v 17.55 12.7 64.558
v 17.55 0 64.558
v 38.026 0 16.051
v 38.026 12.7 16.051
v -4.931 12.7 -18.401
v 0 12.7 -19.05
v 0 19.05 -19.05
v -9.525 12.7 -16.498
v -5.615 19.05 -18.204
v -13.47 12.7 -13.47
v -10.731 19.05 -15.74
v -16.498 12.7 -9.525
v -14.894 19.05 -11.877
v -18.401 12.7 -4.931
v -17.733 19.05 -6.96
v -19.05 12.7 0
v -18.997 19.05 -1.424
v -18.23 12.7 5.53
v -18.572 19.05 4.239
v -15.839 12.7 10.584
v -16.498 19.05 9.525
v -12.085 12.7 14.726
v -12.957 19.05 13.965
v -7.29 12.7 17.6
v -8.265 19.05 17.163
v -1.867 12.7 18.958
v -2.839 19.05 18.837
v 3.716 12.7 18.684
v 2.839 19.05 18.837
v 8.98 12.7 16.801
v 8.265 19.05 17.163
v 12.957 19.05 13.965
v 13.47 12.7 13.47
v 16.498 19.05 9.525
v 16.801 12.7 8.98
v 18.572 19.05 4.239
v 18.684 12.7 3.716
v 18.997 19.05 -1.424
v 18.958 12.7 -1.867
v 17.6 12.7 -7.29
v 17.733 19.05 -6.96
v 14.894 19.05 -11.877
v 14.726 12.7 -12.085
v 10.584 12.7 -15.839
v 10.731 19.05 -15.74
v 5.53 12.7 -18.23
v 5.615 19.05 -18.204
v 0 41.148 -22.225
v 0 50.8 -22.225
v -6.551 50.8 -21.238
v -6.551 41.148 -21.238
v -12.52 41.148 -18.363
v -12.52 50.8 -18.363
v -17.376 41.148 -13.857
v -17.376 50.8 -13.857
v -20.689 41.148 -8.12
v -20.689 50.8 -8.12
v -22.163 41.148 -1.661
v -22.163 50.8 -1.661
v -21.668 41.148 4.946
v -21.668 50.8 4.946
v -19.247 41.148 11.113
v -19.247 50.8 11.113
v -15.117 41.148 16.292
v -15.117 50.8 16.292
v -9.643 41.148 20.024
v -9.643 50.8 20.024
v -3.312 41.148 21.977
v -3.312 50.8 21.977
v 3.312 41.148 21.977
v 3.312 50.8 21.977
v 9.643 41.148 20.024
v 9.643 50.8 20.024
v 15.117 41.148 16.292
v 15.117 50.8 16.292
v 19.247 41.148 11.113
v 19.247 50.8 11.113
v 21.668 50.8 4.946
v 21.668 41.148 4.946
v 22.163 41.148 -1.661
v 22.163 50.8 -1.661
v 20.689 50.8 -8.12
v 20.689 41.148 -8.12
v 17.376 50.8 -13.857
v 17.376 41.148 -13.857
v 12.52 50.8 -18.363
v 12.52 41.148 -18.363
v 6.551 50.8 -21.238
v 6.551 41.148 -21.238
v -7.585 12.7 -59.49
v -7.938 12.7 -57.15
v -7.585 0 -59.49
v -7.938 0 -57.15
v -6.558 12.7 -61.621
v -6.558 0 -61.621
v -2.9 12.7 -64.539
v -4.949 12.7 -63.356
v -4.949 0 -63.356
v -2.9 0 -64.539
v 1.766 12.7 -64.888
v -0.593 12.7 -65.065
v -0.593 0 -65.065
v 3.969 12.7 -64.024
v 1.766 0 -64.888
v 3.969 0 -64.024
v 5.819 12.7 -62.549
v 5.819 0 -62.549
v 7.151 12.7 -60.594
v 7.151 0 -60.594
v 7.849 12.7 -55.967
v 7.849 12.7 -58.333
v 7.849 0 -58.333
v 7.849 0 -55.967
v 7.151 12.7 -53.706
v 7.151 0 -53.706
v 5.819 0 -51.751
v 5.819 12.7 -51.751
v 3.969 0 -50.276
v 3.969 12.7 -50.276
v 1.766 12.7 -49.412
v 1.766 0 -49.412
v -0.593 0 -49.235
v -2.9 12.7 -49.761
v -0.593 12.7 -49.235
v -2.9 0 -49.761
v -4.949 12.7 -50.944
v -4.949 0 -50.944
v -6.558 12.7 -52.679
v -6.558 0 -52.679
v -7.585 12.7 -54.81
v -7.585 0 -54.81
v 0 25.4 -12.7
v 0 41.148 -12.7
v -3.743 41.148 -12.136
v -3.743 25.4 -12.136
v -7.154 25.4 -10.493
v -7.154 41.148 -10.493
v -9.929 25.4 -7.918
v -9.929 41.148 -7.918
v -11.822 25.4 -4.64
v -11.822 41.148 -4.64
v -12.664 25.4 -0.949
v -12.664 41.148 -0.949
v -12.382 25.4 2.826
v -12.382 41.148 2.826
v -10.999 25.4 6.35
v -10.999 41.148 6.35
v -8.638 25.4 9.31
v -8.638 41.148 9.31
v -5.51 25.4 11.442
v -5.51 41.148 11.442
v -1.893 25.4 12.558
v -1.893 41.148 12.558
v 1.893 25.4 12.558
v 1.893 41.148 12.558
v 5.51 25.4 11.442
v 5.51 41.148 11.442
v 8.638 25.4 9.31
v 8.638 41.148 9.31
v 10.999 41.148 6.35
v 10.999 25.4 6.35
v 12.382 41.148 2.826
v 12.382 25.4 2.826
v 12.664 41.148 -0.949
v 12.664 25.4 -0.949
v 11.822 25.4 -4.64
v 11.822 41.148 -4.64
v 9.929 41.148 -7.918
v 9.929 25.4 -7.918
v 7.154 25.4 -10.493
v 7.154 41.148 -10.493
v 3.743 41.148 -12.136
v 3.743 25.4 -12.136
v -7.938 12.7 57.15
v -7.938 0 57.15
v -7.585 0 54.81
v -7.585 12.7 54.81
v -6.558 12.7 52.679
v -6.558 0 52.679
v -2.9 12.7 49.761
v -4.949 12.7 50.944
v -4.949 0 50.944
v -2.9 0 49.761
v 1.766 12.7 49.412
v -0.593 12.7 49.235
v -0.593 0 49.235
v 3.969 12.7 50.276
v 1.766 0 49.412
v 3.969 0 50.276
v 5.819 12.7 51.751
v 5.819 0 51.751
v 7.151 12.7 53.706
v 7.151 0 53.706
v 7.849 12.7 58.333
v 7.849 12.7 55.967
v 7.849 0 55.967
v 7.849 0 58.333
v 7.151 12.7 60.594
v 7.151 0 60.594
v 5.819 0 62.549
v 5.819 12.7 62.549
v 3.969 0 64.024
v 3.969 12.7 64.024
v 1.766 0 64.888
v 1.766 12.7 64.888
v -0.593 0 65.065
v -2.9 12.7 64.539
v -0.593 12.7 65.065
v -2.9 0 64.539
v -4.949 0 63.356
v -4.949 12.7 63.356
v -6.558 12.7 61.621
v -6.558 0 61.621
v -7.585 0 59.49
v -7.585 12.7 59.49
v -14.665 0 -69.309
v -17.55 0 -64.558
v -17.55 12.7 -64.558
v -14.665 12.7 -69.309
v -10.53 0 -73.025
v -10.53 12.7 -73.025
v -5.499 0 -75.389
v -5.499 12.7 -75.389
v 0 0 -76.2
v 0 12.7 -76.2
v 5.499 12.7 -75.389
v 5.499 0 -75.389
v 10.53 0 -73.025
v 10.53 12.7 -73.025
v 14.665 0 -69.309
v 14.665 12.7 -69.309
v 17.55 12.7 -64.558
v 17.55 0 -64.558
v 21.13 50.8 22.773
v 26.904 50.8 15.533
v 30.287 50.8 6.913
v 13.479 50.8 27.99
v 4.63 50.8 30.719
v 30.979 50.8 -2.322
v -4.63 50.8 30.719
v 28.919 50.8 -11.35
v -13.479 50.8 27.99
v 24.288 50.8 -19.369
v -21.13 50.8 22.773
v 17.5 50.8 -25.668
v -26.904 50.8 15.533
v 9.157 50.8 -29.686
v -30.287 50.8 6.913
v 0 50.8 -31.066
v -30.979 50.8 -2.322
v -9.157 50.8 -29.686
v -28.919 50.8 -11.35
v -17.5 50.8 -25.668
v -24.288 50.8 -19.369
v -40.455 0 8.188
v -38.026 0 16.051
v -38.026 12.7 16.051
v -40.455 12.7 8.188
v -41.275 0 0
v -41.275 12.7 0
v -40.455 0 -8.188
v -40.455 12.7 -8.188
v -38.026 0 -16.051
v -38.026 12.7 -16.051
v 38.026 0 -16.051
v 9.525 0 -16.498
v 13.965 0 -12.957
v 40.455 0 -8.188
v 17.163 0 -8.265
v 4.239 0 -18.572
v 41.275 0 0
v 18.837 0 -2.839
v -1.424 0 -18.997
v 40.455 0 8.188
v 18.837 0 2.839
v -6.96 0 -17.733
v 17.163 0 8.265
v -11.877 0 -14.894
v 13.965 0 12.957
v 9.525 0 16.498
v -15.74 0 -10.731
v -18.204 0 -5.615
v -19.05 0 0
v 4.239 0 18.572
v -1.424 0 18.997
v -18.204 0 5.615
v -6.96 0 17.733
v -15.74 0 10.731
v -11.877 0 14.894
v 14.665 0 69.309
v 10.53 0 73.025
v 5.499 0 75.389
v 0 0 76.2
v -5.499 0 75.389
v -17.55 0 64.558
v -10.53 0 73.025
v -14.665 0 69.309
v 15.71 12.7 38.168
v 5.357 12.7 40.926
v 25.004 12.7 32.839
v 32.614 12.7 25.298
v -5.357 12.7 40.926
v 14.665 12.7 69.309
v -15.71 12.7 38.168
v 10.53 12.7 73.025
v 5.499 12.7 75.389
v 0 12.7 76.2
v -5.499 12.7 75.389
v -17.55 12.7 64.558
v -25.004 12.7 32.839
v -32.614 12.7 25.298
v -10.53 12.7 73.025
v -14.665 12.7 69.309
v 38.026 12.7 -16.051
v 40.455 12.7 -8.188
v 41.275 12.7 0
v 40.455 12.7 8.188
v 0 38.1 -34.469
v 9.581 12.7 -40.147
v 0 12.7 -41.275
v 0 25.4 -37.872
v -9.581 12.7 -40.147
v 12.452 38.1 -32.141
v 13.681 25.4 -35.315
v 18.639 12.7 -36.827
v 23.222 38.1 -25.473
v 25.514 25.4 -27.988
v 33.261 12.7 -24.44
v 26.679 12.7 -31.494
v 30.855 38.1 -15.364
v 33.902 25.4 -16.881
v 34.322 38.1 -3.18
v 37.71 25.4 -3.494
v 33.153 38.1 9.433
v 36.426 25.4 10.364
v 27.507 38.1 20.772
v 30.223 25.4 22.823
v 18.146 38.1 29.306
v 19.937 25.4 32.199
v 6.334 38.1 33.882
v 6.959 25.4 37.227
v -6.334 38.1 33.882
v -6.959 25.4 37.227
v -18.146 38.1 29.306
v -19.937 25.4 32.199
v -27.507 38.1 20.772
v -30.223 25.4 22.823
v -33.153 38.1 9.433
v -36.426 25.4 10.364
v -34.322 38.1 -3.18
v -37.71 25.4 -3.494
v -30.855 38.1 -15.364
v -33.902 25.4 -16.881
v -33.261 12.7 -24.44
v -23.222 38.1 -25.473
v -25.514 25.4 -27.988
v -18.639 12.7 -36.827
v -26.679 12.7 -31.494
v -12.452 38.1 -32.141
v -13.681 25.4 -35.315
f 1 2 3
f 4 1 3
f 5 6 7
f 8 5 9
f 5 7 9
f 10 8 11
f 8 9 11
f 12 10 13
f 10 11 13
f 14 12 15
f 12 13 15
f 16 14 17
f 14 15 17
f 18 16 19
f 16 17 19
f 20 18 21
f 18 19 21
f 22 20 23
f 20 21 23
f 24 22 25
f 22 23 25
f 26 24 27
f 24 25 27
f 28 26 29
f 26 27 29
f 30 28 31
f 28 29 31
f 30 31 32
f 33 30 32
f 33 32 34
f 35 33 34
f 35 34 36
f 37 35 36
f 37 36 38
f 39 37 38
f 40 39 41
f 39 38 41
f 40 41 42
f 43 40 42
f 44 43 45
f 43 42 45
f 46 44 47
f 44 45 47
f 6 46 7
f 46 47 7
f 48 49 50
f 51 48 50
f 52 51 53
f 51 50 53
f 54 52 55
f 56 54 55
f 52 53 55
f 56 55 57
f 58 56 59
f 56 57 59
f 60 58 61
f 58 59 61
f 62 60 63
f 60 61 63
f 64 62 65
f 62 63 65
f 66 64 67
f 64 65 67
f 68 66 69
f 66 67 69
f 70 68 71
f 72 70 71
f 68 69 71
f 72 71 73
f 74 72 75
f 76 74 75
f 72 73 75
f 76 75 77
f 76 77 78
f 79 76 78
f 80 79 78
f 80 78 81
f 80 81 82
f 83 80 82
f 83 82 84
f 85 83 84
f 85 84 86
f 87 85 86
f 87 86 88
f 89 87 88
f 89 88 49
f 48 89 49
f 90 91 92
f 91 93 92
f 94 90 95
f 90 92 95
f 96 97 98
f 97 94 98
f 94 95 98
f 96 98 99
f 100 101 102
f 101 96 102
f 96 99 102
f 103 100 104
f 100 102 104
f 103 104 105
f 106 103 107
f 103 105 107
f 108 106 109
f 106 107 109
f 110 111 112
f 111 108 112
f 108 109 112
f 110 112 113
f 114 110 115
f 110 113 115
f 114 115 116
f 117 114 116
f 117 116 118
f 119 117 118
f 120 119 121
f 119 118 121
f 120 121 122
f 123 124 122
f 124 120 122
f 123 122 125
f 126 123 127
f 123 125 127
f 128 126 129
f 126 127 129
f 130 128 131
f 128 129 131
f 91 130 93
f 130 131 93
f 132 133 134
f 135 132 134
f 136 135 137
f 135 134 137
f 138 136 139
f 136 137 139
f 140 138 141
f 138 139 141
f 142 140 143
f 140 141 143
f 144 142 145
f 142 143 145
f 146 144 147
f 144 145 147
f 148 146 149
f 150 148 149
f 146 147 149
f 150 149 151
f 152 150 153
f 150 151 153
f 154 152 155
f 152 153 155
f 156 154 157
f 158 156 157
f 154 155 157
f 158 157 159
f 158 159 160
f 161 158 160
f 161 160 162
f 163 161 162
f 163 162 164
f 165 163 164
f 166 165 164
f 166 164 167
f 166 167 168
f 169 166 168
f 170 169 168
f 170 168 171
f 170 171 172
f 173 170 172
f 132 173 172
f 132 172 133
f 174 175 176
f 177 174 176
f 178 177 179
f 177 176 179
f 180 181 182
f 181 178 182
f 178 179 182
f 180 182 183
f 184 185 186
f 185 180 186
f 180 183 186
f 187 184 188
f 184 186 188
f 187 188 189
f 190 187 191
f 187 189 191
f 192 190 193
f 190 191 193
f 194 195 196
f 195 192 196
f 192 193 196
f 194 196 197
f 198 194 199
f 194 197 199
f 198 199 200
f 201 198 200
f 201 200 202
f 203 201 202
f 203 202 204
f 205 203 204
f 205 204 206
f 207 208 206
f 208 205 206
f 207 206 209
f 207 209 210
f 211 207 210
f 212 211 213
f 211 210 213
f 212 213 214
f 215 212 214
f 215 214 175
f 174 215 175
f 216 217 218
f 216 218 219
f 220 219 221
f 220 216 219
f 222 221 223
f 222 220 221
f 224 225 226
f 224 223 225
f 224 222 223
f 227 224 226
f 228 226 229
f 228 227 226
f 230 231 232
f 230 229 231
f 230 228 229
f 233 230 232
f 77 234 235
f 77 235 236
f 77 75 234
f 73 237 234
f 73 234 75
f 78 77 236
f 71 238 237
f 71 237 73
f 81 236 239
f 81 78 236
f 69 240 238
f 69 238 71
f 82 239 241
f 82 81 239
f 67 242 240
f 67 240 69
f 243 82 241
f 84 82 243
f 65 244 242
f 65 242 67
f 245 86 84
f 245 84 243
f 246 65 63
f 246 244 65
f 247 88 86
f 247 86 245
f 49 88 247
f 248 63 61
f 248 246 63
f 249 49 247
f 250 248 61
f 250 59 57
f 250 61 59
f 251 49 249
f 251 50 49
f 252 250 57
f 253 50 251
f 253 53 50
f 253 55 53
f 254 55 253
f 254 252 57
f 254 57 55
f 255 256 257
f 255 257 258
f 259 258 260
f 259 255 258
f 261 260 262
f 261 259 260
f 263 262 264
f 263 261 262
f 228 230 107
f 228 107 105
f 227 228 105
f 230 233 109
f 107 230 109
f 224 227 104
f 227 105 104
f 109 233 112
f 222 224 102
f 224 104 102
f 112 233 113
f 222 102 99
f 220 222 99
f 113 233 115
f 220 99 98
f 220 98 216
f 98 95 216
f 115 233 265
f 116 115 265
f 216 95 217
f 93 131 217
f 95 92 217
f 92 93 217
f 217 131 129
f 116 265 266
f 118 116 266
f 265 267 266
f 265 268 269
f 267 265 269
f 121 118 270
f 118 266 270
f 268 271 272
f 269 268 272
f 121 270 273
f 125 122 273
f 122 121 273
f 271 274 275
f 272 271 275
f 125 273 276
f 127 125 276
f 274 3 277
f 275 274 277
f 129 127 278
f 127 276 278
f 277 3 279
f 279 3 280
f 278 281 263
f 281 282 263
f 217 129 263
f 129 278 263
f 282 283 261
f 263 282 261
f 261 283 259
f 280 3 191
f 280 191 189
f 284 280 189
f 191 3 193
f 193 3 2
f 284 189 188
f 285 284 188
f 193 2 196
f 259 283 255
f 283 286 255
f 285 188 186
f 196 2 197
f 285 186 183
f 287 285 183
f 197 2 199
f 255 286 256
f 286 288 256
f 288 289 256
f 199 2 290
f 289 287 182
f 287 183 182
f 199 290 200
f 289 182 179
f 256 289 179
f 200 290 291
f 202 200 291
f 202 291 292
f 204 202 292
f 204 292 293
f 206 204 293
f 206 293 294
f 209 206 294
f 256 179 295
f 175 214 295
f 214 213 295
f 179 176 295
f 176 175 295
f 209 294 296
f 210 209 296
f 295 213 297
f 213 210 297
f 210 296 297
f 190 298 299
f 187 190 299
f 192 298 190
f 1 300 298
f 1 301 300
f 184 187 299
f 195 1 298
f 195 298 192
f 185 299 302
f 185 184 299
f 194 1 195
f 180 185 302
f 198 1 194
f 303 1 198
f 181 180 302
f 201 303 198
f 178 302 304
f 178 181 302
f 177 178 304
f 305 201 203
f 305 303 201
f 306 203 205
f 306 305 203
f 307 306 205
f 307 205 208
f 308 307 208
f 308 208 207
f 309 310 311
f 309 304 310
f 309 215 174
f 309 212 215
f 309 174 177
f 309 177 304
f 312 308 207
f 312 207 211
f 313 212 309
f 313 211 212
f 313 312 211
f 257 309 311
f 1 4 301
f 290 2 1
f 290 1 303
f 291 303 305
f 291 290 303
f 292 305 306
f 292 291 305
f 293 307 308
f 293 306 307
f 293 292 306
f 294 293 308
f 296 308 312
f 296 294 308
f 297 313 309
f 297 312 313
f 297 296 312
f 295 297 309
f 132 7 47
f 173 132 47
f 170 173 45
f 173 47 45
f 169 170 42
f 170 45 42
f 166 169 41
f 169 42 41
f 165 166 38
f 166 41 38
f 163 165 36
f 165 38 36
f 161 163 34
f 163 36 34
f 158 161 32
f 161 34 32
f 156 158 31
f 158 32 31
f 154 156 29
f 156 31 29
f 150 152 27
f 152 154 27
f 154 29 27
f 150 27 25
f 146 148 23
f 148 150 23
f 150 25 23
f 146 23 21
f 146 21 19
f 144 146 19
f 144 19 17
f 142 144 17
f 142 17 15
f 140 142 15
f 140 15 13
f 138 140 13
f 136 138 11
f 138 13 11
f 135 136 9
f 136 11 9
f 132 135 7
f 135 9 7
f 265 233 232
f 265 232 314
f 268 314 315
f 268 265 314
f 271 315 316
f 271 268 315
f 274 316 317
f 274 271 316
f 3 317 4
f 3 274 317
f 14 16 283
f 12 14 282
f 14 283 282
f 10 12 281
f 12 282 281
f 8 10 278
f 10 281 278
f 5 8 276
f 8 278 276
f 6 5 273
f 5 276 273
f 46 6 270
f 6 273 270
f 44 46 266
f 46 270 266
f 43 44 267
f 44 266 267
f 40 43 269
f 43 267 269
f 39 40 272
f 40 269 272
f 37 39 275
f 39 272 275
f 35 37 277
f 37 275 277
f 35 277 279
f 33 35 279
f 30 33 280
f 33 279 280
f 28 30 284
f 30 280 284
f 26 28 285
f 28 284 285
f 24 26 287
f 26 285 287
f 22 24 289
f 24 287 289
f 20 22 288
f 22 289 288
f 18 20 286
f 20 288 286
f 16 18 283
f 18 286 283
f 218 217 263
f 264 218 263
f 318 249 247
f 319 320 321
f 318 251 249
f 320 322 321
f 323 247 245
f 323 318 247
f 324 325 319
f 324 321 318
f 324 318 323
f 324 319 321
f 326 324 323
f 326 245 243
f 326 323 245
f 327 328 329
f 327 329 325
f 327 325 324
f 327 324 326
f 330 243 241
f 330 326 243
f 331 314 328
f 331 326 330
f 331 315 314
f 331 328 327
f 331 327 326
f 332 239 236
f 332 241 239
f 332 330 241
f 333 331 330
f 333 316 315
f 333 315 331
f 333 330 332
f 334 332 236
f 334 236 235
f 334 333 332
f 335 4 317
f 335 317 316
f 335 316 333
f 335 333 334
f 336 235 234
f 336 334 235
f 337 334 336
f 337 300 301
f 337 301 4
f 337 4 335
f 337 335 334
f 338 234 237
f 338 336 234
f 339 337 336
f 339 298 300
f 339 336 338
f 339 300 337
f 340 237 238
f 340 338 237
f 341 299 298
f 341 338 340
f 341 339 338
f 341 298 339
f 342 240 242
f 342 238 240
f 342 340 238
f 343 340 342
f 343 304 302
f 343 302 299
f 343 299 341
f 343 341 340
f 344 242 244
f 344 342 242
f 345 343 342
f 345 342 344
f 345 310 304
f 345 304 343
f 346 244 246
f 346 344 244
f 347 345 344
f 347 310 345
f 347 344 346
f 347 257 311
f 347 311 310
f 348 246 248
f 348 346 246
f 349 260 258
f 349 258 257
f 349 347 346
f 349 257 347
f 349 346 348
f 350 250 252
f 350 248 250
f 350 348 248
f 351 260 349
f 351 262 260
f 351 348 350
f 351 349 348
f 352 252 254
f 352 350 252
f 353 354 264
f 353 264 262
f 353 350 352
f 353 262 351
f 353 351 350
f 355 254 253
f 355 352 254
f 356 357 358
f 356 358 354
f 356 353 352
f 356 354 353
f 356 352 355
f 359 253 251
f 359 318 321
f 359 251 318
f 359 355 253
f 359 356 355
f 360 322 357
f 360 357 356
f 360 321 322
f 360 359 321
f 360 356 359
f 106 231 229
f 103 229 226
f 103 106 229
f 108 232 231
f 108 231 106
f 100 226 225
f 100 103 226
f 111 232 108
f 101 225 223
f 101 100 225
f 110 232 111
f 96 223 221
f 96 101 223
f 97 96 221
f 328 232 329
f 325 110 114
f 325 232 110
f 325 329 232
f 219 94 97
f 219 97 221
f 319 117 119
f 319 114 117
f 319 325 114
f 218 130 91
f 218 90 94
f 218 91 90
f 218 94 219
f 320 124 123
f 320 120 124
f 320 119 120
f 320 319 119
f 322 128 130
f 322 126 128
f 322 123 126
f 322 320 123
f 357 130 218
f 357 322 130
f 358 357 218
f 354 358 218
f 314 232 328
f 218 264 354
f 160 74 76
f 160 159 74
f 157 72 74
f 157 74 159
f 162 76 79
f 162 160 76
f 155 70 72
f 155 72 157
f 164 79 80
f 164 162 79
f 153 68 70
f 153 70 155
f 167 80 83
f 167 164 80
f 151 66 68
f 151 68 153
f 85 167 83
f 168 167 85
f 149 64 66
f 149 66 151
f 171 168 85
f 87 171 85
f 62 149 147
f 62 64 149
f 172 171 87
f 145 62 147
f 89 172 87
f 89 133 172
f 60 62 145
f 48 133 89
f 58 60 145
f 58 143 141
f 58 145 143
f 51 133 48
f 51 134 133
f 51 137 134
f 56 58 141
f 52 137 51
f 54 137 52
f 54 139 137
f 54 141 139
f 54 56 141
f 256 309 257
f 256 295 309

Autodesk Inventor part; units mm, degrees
ref_plane "YZ Plane" through (0, 0, 0) normal (1, 0, 0) x (0, 1, 0)
ref_plane "XZ Plane" through (0, 0, 0) normal (0, 1, 0) x (-1, 0, 0)
ref_plane "XY Plane" through (0, 0, 0) normal (0, 0, 1) x (1, 0, 0)
sketch "Sketch1" plane through (0, 0, 0) normal (0, 1, 0) x (-1, 0, 0)
  circle A0 centre (0, 0) radius 19.05
  circle A1 centre (0, 0) radius 41.275 construction
  line L0 (0, -57.15) -> (0, 57.15) construction
  circle A2 centre (0, -57.15) radius 7.9375
  line L1 (57.785, 0) -> (-57.785, 0) construction
  circle A3 centre (0, -57.15) radius 19.05 construction
  circle A4 centre (0, 57.15) radius 7.9375
  circle A5 centre (0, 57.15) radius 19.05 construction
  line L2 (-17.5505, -64.5583) -> (-38.026, -16.0514)
  line L3 (17.5505, -64.5583) -> (38.026, -16.0514)
  line L4 (-17.5505, 64.5583) -> (-38.026, 16.0514)
  line L5 (17.5505, 64.5583) -> (38.026, 16.0514)
  arc A6 (-17.5505, -64.5583) -> (17.5505, -64.5583) centre (0, -57.15) ccw
  arc A7 (17.5505, 64.5583) -> (-17.5505, 64.5583) centre (0, 57.15) ccw
  arc A8 (-38.026, 16.0514) -> (-38.026, -16.0514) centre (0, 0) ccw
  arc A9 (38.026, -16.0514) -> (38.026, 16.0514) centre (0, 0) ccw
  dimension "d1" = 82.55
  dimension "d4" = 38.1
  dimension "d0" = 38.1
  dimension "d2" = 114.3
  dimension "d3" = 15.875
extrude "Extrusion1" add sketch "Sketch1" along normal blind 12.7
sketch "Sketch2" plane through (0, 0, 0) normal (1, 0, 0) x (0, 1, 0)
  line L0 (0, -19.05) -> (12.7, -19.05) construction
  line L1 (12.7, -19.05) -> (19.05, -19.05)
  line L2 (19.05, -19.05) -> (25.4, -12.7)
  line L3 (25.4, -12.7) -> (41.148, -12.7)
  line L4 (41.148, -12.7) -> (41.148, -22.225)
  line L5 (41.148, -22.225) -> (50.8, -22.225)
  line L6 (50.8, -22.225) -> (50.8, -31.0661)
  line L7 (50.8, -31.0661) -> (12.7, -41.275)
  line L8 (12.7, -64.5583) -> (12.7, -16.0514) construction
  line L9 (0, -16.0514) -> (0, -64.5583) construction
  line L10 (12.7, -19.05) -> (12.7, -41.275)
  line L11 (12.7, -19.05) -> (12.7, -41.275)
  line L12 (12.7, -41.275) -> (50.8, -31.0661)
  line L13 (50.8, -31.0661) -> (50.8, -22.225)
  line L14 (41.148, -22.225) -> (50.8, -22.225)
  line L15 (41.148, -22.225) -> (41.148, -12.7)
  line L16 (41.148, -12.7) -> (25.4, -12.7)
  line L17 (25.4, -12.7) -> (19.05, -19.05)
  line L18 (19.05, -19.05) -> (12.7, -19.05)
  line L19 (12.7, -41.275) -> (28.7707, -41.275) construction
  line L20 (-10.16, 0) -> (60.96, 0) construction
  point P0 (0, 0)
  dimension "d7" = 50.8
  dimension "d8" = 19.05
  dimension "d9" = 12.7
  dimension "d10" = 41.275
  dimension "d12" = 22.225
  dimension "d13" = 9.652
  dimension "d14" = 25.4
  dimension "d16" = 15
revolve "Revolution1" add sketch "Sketch2" angle 360 about axis through (0, -10, 0) along (0, 1, 0)
properties part number "SólidoC"
